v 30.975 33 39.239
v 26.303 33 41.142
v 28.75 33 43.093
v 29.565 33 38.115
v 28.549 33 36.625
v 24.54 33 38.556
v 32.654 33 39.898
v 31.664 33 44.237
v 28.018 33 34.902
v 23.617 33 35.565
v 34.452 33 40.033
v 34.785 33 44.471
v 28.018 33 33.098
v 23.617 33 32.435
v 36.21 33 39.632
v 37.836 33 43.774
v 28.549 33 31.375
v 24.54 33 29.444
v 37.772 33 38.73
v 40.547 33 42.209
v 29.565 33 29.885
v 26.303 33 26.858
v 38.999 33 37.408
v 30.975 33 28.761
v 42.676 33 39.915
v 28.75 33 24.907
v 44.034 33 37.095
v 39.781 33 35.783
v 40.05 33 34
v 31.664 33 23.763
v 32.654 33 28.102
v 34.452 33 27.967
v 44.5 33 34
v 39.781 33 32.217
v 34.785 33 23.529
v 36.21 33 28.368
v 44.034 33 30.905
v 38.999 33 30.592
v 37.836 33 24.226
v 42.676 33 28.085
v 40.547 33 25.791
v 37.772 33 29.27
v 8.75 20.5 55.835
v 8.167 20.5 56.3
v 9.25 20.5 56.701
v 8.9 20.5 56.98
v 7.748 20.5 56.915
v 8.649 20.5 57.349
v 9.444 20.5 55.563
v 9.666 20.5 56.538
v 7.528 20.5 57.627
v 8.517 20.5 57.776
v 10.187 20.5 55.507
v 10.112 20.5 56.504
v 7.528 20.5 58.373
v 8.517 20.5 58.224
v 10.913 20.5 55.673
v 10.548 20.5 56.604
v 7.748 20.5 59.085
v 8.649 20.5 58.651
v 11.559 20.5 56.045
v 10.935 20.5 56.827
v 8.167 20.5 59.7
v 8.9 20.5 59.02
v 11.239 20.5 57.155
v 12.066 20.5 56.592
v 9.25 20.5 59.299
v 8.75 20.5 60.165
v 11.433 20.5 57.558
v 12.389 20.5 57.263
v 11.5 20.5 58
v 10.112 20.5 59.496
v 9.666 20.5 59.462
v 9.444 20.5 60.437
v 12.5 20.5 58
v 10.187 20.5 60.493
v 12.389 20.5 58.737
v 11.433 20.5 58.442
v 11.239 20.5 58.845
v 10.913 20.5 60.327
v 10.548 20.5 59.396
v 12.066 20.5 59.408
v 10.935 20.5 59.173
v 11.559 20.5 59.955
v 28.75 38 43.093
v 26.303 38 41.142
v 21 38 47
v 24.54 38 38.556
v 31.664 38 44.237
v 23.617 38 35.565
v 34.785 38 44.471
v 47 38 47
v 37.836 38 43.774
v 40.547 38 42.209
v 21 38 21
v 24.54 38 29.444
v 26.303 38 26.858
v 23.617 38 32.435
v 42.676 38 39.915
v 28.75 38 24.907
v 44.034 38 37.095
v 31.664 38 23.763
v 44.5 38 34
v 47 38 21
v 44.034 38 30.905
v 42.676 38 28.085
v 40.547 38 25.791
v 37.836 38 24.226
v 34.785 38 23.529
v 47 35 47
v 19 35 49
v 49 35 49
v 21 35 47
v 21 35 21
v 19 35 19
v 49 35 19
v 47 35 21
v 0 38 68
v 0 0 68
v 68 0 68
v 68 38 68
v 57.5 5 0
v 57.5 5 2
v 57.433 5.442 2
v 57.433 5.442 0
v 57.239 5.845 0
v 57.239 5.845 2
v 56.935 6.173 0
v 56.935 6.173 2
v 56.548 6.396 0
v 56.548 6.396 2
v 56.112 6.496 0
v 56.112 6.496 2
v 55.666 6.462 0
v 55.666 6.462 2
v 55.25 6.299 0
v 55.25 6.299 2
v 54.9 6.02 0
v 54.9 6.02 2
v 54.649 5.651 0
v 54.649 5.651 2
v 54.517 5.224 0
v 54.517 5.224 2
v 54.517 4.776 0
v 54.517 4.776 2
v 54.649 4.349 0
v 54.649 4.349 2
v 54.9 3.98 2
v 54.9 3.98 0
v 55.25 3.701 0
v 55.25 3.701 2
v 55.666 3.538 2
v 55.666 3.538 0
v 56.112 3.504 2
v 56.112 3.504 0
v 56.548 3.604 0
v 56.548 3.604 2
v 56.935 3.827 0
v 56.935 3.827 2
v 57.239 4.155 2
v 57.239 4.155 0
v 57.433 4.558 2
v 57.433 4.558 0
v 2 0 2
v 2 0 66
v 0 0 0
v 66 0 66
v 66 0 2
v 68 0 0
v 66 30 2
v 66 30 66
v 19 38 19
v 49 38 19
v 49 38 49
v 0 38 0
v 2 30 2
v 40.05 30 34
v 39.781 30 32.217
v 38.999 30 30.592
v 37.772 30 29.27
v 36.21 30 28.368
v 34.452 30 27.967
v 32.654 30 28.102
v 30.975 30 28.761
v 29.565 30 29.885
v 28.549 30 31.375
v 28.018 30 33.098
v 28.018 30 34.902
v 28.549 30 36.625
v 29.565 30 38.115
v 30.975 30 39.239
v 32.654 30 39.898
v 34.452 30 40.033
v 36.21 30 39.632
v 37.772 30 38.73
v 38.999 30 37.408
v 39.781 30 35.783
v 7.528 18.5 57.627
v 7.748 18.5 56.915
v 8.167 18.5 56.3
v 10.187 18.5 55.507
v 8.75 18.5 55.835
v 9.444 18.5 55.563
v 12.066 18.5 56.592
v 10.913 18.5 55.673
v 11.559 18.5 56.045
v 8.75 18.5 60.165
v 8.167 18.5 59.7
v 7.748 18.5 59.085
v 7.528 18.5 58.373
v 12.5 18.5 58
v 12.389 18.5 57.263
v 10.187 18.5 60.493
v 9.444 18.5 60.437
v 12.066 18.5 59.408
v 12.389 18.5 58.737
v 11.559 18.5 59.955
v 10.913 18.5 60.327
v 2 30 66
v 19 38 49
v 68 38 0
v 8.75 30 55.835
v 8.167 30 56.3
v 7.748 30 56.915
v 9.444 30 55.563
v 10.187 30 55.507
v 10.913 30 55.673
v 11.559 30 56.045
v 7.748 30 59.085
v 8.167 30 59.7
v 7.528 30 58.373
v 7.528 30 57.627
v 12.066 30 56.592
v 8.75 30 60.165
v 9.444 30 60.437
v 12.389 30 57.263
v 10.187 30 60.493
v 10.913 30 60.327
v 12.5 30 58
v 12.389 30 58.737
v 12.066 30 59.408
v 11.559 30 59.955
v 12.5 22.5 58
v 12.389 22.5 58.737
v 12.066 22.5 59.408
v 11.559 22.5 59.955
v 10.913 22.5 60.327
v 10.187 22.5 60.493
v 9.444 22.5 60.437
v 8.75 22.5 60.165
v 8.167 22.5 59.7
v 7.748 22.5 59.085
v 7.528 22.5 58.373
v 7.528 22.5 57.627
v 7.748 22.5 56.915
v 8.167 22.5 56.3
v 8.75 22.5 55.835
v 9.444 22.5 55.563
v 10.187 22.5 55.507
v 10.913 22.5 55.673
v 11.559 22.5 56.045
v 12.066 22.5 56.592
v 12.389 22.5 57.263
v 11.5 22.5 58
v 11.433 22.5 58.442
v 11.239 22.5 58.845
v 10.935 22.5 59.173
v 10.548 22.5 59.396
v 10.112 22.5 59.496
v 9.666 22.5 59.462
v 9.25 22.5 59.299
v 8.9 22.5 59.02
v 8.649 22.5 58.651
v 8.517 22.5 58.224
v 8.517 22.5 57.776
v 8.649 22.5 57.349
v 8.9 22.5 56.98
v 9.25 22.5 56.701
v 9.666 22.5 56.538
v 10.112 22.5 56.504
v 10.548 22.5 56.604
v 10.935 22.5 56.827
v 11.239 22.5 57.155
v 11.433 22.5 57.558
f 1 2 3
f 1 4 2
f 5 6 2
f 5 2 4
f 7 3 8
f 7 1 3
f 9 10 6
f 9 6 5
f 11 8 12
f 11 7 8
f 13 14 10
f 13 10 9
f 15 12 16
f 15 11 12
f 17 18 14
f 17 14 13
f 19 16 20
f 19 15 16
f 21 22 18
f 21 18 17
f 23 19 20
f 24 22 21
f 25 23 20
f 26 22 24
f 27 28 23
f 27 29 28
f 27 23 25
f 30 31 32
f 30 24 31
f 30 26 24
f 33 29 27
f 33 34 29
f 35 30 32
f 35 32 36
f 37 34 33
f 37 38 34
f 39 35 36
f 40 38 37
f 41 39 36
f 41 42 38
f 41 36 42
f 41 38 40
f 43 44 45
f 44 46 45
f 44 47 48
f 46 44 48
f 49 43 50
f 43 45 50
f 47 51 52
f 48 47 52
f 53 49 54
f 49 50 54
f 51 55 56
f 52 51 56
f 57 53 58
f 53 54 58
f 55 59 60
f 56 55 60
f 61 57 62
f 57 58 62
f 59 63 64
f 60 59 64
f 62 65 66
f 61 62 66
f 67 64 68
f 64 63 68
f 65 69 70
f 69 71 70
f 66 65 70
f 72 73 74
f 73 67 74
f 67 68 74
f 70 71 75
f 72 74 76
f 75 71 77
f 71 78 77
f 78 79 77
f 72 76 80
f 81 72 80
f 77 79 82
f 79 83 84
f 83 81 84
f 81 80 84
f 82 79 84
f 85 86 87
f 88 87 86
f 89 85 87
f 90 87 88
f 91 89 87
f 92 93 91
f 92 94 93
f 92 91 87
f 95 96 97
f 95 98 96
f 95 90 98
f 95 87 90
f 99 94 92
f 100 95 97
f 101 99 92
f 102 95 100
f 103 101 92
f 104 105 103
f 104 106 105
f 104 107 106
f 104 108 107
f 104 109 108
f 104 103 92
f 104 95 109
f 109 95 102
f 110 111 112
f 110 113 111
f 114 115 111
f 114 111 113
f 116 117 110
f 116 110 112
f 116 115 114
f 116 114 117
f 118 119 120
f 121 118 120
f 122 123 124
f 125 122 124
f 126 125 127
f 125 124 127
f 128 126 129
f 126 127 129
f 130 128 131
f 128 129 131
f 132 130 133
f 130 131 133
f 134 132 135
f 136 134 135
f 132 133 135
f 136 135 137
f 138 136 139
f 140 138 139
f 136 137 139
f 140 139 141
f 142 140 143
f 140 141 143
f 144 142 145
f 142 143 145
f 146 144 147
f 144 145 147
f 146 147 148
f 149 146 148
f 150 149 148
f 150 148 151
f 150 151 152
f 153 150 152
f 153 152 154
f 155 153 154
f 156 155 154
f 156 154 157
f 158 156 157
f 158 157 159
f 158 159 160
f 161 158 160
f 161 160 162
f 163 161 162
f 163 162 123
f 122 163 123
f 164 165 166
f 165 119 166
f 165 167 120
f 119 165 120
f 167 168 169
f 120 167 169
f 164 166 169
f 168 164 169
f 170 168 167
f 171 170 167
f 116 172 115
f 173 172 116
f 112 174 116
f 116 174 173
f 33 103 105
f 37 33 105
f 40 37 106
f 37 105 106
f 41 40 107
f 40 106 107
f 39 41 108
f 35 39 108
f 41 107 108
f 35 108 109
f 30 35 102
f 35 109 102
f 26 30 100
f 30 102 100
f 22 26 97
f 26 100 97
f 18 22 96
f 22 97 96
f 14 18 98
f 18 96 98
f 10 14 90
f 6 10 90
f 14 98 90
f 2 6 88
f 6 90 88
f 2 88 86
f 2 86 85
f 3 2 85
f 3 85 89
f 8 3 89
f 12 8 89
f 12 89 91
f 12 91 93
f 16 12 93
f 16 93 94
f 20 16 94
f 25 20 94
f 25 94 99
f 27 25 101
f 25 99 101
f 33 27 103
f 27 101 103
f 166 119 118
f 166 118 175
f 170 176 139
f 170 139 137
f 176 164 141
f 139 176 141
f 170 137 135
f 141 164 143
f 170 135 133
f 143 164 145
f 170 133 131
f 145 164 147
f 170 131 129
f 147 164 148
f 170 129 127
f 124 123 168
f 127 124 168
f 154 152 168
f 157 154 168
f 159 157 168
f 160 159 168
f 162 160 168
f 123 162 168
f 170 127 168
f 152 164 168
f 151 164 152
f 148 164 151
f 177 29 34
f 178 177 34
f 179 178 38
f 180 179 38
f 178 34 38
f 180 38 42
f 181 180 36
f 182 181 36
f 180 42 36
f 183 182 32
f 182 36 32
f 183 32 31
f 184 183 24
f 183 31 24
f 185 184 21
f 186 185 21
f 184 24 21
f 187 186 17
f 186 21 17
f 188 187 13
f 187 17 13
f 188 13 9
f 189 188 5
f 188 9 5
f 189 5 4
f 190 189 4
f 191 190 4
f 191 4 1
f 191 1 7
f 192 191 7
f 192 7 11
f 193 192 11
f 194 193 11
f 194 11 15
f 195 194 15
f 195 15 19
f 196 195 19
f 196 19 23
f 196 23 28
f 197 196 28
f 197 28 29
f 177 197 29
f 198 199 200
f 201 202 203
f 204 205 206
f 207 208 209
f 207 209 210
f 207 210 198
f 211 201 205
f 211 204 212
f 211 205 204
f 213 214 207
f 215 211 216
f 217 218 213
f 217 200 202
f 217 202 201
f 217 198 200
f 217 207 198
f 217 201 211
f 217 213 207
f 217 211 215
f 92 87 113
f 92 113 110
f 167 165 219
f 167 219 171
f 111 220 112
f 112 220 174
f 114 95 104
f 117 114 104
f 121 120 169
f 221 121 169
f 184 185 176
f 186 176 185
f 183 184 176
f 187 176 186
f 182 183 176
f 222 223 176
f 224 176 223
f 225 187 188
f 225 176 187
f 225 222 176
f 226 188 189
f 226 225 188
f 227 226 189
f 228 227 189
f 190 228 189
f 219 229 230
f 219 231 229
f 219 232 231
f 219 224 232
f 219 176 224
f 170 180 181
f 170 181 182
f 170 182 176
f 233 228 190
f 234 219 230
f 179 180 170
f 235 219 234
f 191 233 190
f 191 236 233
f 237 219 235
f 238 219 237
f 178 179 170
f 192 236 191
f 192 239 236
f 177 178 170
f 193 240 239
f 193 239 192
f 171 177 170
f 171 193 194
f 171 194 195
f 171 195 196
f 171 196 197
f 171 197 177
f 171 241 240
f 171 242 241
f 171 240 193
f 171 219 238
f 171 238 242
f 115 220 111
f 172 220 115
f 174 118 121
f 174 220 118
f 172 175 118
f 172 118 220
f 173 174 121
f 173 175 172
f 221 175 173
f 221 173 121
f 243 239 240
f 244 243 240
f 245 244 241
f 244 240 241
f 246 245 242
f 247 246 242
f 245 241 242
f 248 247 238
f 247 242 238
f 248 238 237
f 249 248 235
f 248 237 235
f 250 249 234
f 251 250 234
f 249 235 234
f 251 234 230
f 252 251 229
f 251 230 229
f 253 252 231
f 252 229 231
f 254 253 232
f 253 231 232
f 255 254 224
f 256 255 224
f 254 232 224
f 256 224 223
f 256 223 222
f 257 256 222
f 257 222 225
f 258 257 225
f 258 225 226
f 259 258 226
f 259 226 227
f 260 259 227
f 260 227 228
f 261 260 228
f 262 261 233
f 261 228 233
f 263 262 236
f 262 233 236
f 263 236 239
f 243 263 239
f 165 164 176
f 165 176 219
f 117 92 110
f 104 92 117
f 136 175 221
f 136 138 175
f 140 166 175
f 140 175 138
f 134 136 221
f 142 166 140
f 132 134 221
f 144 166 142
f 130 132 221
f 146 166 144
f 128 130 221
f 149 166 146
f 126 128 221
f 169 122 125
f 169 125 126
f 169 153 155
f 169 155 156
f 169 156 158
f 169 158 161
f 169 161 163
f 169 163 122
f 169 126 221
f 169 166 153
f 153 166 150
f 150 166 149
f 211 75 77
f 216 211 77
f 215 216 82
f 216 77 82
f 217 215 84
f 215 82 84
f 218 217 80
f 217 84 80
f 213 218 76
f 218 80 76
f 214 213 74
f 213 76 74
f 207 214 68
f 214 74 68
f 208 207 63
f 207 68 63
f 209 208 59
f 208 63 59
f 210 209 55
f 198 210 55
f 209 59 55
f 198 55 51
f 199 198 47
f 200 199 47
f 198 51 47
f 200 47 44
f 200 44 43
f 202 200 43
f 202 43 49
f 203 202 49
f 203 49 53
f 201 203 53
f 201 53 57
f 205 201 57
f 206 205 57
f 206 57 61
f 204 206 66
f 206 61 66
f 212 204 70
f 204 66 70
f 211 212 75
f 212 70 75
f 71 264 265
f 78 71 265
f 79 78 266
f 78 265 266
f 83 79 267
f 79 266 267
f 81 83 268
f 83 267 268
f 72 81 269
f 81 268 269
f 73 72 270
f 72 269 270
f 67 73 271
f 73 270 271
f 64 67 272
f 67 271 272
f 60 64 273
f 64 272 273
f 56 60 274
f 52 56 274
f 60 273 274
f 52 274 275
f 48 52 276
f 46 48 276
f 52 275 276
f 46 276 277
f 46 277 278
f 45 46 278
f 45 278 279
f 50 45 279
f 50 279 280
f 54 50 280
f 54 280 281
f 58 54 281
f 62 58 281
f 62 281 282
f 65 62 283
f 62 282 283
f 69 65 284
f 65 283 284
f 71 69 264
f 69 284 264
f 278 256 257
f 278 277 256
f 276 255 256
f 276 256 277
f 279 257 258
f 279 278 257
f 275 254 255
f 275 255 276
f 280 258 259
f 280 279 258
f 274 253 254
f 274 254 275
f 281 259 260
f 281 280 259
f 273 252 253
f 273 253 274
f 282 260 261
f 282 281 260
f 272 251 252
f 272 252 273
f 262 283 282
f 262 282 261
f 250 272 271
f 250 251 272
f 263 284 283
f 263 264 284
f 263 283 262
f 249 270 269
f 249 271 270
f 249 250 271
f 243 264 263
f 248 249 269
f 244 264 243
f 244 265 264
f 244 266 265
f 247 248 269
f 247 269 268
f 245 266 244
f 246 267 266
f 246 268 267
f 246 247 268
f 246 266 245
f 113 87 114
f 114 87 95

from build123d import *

# Parameters (mm, degrees)
SKETCH2_W           = 68
SKETCH2_H           = 68
BOSS_EXTRUDE1_DEPTH = 38
SKETCH3_W           = 64
SKETCH3_H           = 64
CUT_EXTRUDE1_DEPTH  = 30
SKETCH5_W           = 30
SKETCH5_H           = 30
SKETCH5_W_2         = 26
SKETCH5_H_2         = 26
CUT_EXTRUDE2_DEPTH  = 3
SKETCH6_R           = 6.05
CUT_EXTRUDE3_DEPTH  = 39
SKETCH7_R           = 10.5
CUT_EXTRUDE4_DEPTH  = 5
SKETCH8_R           = 1.5
CUT_EXTRUDE5_DEPTH  = 3
SKETCH9_R           = 2.5
BOSS_EXTRUDE2_DEPTH = 7.5
SKETCH10_R          = 1.5
BOSS_EXTRUDE3_DEPTH = 2
SKETCH11_R          = 2.5
BOSS_EXTRUDE4_DEPTH = 2


with BuildPart() as part:
    # Sketch2 → Boss-Extrude1 (new body)
    with BuildSketch(Plane(origin=(0, 0, 0), x_dir=(1, 0, 0), z_dir=(0, 1, 0))):
        with Locations((34, -34)):
            Rectangle(SKETCH2_W, SKETCH2_H)
    extrude(amount=BOSS_EXTRUDE1_DEPTH)

    # Sketch3 → Cut-Extrude1 (cut)
    with BuildSketch(Plane.XZ):
        with Locations((34, 34)):
            Rectangle(SKETCH3_W, SKETCH3_H)
    extrude(amount=-CUT_EXTRUDE1_DEPTH, mode=Mode.SUBTRACT)

    # Sketch5 → Cut-Extrude2 (cut)
    with BuildSketch(Plane(origin=(0, 38, 0), x_dir=(1, 0, 0), z_dir=(0, 1, 0))):
        with Locations((34, -34)):
            Rectangle(SKETCH5_W, SKETCH5_H)
        with Locations((34, -34)):
            Rectangle(SKETCH5_W_2, SKETCH5_H_2, mode=Mode.SUBTRACT)
    extrude(amount=-CUT_EXTRUDE2_DEPTH, mode=Mode.SUBTRACT)

    # Sketch6 → Cut-Extrude3 (cut, through all)
    with BuildSketch(Plane(origin=(0, 38, 0), x_dir=(1, 0, 0), z_dir=(0, 1, 0))):
        with Locations((34, -34)):
            Circle(SKETCH6_R)
    extrude(amount=-CUT_EXTRUDE3_DEPTH, mode=Mode.SUBTRACT)

    # Sketch7 → Cut-Extrude4 (cut)
    with BuildSketch(Plane(origin=(0, 38, 0), x_dir=(1, 0, 0), z_dir=(0, 1, 0))):
        with Locations((34, -34)):
            Circle(SKETCH7_R)
    extrude(amount=-CUT_EXTRUDE4_DEPTH, mode=Mode.SUBTRACT)

    # Sketch8 → Cut-Extrude5 (cut, through all)
    with BuildSketch(Plane.XY.offset(2)):
        with Locations((56, 5)):
            Circle(SKETCH8_R)
    extrude(amount=-CUT_EXTRUDE5_DEPTH, mode=Mode.SUBTRACT)

    # Sketch9 → Boss-Extrude2 (add)
    with BuildSketch(Plane.XZ.offset(-30)):
        with Locations((10, 58)):
            Circle(SKETCH9_R)
    extrude(amount=BOSS_EXTRUDE2_DEPTH)

    # Sketch10 → Boss-Extrude3 (add)
    with BuildSketch(Plane.XZ.offset(-22.5)):
        with Locations((10, 58)):
            Circle(SKETCH10_R)
    extrude(amount=BOSS_EXTRUDE3_DEPTH)

    # Sketch11 → Boss-Extrude4 (add)
    with BuildSketch(Plane.XZ.offset(-20.5)):
        with Locations((10, 58)):
            Circle(SKETCH11_R)
    extrude(amount=BOSS_EXTRUDE4_DEPTH)


solid = part.part
